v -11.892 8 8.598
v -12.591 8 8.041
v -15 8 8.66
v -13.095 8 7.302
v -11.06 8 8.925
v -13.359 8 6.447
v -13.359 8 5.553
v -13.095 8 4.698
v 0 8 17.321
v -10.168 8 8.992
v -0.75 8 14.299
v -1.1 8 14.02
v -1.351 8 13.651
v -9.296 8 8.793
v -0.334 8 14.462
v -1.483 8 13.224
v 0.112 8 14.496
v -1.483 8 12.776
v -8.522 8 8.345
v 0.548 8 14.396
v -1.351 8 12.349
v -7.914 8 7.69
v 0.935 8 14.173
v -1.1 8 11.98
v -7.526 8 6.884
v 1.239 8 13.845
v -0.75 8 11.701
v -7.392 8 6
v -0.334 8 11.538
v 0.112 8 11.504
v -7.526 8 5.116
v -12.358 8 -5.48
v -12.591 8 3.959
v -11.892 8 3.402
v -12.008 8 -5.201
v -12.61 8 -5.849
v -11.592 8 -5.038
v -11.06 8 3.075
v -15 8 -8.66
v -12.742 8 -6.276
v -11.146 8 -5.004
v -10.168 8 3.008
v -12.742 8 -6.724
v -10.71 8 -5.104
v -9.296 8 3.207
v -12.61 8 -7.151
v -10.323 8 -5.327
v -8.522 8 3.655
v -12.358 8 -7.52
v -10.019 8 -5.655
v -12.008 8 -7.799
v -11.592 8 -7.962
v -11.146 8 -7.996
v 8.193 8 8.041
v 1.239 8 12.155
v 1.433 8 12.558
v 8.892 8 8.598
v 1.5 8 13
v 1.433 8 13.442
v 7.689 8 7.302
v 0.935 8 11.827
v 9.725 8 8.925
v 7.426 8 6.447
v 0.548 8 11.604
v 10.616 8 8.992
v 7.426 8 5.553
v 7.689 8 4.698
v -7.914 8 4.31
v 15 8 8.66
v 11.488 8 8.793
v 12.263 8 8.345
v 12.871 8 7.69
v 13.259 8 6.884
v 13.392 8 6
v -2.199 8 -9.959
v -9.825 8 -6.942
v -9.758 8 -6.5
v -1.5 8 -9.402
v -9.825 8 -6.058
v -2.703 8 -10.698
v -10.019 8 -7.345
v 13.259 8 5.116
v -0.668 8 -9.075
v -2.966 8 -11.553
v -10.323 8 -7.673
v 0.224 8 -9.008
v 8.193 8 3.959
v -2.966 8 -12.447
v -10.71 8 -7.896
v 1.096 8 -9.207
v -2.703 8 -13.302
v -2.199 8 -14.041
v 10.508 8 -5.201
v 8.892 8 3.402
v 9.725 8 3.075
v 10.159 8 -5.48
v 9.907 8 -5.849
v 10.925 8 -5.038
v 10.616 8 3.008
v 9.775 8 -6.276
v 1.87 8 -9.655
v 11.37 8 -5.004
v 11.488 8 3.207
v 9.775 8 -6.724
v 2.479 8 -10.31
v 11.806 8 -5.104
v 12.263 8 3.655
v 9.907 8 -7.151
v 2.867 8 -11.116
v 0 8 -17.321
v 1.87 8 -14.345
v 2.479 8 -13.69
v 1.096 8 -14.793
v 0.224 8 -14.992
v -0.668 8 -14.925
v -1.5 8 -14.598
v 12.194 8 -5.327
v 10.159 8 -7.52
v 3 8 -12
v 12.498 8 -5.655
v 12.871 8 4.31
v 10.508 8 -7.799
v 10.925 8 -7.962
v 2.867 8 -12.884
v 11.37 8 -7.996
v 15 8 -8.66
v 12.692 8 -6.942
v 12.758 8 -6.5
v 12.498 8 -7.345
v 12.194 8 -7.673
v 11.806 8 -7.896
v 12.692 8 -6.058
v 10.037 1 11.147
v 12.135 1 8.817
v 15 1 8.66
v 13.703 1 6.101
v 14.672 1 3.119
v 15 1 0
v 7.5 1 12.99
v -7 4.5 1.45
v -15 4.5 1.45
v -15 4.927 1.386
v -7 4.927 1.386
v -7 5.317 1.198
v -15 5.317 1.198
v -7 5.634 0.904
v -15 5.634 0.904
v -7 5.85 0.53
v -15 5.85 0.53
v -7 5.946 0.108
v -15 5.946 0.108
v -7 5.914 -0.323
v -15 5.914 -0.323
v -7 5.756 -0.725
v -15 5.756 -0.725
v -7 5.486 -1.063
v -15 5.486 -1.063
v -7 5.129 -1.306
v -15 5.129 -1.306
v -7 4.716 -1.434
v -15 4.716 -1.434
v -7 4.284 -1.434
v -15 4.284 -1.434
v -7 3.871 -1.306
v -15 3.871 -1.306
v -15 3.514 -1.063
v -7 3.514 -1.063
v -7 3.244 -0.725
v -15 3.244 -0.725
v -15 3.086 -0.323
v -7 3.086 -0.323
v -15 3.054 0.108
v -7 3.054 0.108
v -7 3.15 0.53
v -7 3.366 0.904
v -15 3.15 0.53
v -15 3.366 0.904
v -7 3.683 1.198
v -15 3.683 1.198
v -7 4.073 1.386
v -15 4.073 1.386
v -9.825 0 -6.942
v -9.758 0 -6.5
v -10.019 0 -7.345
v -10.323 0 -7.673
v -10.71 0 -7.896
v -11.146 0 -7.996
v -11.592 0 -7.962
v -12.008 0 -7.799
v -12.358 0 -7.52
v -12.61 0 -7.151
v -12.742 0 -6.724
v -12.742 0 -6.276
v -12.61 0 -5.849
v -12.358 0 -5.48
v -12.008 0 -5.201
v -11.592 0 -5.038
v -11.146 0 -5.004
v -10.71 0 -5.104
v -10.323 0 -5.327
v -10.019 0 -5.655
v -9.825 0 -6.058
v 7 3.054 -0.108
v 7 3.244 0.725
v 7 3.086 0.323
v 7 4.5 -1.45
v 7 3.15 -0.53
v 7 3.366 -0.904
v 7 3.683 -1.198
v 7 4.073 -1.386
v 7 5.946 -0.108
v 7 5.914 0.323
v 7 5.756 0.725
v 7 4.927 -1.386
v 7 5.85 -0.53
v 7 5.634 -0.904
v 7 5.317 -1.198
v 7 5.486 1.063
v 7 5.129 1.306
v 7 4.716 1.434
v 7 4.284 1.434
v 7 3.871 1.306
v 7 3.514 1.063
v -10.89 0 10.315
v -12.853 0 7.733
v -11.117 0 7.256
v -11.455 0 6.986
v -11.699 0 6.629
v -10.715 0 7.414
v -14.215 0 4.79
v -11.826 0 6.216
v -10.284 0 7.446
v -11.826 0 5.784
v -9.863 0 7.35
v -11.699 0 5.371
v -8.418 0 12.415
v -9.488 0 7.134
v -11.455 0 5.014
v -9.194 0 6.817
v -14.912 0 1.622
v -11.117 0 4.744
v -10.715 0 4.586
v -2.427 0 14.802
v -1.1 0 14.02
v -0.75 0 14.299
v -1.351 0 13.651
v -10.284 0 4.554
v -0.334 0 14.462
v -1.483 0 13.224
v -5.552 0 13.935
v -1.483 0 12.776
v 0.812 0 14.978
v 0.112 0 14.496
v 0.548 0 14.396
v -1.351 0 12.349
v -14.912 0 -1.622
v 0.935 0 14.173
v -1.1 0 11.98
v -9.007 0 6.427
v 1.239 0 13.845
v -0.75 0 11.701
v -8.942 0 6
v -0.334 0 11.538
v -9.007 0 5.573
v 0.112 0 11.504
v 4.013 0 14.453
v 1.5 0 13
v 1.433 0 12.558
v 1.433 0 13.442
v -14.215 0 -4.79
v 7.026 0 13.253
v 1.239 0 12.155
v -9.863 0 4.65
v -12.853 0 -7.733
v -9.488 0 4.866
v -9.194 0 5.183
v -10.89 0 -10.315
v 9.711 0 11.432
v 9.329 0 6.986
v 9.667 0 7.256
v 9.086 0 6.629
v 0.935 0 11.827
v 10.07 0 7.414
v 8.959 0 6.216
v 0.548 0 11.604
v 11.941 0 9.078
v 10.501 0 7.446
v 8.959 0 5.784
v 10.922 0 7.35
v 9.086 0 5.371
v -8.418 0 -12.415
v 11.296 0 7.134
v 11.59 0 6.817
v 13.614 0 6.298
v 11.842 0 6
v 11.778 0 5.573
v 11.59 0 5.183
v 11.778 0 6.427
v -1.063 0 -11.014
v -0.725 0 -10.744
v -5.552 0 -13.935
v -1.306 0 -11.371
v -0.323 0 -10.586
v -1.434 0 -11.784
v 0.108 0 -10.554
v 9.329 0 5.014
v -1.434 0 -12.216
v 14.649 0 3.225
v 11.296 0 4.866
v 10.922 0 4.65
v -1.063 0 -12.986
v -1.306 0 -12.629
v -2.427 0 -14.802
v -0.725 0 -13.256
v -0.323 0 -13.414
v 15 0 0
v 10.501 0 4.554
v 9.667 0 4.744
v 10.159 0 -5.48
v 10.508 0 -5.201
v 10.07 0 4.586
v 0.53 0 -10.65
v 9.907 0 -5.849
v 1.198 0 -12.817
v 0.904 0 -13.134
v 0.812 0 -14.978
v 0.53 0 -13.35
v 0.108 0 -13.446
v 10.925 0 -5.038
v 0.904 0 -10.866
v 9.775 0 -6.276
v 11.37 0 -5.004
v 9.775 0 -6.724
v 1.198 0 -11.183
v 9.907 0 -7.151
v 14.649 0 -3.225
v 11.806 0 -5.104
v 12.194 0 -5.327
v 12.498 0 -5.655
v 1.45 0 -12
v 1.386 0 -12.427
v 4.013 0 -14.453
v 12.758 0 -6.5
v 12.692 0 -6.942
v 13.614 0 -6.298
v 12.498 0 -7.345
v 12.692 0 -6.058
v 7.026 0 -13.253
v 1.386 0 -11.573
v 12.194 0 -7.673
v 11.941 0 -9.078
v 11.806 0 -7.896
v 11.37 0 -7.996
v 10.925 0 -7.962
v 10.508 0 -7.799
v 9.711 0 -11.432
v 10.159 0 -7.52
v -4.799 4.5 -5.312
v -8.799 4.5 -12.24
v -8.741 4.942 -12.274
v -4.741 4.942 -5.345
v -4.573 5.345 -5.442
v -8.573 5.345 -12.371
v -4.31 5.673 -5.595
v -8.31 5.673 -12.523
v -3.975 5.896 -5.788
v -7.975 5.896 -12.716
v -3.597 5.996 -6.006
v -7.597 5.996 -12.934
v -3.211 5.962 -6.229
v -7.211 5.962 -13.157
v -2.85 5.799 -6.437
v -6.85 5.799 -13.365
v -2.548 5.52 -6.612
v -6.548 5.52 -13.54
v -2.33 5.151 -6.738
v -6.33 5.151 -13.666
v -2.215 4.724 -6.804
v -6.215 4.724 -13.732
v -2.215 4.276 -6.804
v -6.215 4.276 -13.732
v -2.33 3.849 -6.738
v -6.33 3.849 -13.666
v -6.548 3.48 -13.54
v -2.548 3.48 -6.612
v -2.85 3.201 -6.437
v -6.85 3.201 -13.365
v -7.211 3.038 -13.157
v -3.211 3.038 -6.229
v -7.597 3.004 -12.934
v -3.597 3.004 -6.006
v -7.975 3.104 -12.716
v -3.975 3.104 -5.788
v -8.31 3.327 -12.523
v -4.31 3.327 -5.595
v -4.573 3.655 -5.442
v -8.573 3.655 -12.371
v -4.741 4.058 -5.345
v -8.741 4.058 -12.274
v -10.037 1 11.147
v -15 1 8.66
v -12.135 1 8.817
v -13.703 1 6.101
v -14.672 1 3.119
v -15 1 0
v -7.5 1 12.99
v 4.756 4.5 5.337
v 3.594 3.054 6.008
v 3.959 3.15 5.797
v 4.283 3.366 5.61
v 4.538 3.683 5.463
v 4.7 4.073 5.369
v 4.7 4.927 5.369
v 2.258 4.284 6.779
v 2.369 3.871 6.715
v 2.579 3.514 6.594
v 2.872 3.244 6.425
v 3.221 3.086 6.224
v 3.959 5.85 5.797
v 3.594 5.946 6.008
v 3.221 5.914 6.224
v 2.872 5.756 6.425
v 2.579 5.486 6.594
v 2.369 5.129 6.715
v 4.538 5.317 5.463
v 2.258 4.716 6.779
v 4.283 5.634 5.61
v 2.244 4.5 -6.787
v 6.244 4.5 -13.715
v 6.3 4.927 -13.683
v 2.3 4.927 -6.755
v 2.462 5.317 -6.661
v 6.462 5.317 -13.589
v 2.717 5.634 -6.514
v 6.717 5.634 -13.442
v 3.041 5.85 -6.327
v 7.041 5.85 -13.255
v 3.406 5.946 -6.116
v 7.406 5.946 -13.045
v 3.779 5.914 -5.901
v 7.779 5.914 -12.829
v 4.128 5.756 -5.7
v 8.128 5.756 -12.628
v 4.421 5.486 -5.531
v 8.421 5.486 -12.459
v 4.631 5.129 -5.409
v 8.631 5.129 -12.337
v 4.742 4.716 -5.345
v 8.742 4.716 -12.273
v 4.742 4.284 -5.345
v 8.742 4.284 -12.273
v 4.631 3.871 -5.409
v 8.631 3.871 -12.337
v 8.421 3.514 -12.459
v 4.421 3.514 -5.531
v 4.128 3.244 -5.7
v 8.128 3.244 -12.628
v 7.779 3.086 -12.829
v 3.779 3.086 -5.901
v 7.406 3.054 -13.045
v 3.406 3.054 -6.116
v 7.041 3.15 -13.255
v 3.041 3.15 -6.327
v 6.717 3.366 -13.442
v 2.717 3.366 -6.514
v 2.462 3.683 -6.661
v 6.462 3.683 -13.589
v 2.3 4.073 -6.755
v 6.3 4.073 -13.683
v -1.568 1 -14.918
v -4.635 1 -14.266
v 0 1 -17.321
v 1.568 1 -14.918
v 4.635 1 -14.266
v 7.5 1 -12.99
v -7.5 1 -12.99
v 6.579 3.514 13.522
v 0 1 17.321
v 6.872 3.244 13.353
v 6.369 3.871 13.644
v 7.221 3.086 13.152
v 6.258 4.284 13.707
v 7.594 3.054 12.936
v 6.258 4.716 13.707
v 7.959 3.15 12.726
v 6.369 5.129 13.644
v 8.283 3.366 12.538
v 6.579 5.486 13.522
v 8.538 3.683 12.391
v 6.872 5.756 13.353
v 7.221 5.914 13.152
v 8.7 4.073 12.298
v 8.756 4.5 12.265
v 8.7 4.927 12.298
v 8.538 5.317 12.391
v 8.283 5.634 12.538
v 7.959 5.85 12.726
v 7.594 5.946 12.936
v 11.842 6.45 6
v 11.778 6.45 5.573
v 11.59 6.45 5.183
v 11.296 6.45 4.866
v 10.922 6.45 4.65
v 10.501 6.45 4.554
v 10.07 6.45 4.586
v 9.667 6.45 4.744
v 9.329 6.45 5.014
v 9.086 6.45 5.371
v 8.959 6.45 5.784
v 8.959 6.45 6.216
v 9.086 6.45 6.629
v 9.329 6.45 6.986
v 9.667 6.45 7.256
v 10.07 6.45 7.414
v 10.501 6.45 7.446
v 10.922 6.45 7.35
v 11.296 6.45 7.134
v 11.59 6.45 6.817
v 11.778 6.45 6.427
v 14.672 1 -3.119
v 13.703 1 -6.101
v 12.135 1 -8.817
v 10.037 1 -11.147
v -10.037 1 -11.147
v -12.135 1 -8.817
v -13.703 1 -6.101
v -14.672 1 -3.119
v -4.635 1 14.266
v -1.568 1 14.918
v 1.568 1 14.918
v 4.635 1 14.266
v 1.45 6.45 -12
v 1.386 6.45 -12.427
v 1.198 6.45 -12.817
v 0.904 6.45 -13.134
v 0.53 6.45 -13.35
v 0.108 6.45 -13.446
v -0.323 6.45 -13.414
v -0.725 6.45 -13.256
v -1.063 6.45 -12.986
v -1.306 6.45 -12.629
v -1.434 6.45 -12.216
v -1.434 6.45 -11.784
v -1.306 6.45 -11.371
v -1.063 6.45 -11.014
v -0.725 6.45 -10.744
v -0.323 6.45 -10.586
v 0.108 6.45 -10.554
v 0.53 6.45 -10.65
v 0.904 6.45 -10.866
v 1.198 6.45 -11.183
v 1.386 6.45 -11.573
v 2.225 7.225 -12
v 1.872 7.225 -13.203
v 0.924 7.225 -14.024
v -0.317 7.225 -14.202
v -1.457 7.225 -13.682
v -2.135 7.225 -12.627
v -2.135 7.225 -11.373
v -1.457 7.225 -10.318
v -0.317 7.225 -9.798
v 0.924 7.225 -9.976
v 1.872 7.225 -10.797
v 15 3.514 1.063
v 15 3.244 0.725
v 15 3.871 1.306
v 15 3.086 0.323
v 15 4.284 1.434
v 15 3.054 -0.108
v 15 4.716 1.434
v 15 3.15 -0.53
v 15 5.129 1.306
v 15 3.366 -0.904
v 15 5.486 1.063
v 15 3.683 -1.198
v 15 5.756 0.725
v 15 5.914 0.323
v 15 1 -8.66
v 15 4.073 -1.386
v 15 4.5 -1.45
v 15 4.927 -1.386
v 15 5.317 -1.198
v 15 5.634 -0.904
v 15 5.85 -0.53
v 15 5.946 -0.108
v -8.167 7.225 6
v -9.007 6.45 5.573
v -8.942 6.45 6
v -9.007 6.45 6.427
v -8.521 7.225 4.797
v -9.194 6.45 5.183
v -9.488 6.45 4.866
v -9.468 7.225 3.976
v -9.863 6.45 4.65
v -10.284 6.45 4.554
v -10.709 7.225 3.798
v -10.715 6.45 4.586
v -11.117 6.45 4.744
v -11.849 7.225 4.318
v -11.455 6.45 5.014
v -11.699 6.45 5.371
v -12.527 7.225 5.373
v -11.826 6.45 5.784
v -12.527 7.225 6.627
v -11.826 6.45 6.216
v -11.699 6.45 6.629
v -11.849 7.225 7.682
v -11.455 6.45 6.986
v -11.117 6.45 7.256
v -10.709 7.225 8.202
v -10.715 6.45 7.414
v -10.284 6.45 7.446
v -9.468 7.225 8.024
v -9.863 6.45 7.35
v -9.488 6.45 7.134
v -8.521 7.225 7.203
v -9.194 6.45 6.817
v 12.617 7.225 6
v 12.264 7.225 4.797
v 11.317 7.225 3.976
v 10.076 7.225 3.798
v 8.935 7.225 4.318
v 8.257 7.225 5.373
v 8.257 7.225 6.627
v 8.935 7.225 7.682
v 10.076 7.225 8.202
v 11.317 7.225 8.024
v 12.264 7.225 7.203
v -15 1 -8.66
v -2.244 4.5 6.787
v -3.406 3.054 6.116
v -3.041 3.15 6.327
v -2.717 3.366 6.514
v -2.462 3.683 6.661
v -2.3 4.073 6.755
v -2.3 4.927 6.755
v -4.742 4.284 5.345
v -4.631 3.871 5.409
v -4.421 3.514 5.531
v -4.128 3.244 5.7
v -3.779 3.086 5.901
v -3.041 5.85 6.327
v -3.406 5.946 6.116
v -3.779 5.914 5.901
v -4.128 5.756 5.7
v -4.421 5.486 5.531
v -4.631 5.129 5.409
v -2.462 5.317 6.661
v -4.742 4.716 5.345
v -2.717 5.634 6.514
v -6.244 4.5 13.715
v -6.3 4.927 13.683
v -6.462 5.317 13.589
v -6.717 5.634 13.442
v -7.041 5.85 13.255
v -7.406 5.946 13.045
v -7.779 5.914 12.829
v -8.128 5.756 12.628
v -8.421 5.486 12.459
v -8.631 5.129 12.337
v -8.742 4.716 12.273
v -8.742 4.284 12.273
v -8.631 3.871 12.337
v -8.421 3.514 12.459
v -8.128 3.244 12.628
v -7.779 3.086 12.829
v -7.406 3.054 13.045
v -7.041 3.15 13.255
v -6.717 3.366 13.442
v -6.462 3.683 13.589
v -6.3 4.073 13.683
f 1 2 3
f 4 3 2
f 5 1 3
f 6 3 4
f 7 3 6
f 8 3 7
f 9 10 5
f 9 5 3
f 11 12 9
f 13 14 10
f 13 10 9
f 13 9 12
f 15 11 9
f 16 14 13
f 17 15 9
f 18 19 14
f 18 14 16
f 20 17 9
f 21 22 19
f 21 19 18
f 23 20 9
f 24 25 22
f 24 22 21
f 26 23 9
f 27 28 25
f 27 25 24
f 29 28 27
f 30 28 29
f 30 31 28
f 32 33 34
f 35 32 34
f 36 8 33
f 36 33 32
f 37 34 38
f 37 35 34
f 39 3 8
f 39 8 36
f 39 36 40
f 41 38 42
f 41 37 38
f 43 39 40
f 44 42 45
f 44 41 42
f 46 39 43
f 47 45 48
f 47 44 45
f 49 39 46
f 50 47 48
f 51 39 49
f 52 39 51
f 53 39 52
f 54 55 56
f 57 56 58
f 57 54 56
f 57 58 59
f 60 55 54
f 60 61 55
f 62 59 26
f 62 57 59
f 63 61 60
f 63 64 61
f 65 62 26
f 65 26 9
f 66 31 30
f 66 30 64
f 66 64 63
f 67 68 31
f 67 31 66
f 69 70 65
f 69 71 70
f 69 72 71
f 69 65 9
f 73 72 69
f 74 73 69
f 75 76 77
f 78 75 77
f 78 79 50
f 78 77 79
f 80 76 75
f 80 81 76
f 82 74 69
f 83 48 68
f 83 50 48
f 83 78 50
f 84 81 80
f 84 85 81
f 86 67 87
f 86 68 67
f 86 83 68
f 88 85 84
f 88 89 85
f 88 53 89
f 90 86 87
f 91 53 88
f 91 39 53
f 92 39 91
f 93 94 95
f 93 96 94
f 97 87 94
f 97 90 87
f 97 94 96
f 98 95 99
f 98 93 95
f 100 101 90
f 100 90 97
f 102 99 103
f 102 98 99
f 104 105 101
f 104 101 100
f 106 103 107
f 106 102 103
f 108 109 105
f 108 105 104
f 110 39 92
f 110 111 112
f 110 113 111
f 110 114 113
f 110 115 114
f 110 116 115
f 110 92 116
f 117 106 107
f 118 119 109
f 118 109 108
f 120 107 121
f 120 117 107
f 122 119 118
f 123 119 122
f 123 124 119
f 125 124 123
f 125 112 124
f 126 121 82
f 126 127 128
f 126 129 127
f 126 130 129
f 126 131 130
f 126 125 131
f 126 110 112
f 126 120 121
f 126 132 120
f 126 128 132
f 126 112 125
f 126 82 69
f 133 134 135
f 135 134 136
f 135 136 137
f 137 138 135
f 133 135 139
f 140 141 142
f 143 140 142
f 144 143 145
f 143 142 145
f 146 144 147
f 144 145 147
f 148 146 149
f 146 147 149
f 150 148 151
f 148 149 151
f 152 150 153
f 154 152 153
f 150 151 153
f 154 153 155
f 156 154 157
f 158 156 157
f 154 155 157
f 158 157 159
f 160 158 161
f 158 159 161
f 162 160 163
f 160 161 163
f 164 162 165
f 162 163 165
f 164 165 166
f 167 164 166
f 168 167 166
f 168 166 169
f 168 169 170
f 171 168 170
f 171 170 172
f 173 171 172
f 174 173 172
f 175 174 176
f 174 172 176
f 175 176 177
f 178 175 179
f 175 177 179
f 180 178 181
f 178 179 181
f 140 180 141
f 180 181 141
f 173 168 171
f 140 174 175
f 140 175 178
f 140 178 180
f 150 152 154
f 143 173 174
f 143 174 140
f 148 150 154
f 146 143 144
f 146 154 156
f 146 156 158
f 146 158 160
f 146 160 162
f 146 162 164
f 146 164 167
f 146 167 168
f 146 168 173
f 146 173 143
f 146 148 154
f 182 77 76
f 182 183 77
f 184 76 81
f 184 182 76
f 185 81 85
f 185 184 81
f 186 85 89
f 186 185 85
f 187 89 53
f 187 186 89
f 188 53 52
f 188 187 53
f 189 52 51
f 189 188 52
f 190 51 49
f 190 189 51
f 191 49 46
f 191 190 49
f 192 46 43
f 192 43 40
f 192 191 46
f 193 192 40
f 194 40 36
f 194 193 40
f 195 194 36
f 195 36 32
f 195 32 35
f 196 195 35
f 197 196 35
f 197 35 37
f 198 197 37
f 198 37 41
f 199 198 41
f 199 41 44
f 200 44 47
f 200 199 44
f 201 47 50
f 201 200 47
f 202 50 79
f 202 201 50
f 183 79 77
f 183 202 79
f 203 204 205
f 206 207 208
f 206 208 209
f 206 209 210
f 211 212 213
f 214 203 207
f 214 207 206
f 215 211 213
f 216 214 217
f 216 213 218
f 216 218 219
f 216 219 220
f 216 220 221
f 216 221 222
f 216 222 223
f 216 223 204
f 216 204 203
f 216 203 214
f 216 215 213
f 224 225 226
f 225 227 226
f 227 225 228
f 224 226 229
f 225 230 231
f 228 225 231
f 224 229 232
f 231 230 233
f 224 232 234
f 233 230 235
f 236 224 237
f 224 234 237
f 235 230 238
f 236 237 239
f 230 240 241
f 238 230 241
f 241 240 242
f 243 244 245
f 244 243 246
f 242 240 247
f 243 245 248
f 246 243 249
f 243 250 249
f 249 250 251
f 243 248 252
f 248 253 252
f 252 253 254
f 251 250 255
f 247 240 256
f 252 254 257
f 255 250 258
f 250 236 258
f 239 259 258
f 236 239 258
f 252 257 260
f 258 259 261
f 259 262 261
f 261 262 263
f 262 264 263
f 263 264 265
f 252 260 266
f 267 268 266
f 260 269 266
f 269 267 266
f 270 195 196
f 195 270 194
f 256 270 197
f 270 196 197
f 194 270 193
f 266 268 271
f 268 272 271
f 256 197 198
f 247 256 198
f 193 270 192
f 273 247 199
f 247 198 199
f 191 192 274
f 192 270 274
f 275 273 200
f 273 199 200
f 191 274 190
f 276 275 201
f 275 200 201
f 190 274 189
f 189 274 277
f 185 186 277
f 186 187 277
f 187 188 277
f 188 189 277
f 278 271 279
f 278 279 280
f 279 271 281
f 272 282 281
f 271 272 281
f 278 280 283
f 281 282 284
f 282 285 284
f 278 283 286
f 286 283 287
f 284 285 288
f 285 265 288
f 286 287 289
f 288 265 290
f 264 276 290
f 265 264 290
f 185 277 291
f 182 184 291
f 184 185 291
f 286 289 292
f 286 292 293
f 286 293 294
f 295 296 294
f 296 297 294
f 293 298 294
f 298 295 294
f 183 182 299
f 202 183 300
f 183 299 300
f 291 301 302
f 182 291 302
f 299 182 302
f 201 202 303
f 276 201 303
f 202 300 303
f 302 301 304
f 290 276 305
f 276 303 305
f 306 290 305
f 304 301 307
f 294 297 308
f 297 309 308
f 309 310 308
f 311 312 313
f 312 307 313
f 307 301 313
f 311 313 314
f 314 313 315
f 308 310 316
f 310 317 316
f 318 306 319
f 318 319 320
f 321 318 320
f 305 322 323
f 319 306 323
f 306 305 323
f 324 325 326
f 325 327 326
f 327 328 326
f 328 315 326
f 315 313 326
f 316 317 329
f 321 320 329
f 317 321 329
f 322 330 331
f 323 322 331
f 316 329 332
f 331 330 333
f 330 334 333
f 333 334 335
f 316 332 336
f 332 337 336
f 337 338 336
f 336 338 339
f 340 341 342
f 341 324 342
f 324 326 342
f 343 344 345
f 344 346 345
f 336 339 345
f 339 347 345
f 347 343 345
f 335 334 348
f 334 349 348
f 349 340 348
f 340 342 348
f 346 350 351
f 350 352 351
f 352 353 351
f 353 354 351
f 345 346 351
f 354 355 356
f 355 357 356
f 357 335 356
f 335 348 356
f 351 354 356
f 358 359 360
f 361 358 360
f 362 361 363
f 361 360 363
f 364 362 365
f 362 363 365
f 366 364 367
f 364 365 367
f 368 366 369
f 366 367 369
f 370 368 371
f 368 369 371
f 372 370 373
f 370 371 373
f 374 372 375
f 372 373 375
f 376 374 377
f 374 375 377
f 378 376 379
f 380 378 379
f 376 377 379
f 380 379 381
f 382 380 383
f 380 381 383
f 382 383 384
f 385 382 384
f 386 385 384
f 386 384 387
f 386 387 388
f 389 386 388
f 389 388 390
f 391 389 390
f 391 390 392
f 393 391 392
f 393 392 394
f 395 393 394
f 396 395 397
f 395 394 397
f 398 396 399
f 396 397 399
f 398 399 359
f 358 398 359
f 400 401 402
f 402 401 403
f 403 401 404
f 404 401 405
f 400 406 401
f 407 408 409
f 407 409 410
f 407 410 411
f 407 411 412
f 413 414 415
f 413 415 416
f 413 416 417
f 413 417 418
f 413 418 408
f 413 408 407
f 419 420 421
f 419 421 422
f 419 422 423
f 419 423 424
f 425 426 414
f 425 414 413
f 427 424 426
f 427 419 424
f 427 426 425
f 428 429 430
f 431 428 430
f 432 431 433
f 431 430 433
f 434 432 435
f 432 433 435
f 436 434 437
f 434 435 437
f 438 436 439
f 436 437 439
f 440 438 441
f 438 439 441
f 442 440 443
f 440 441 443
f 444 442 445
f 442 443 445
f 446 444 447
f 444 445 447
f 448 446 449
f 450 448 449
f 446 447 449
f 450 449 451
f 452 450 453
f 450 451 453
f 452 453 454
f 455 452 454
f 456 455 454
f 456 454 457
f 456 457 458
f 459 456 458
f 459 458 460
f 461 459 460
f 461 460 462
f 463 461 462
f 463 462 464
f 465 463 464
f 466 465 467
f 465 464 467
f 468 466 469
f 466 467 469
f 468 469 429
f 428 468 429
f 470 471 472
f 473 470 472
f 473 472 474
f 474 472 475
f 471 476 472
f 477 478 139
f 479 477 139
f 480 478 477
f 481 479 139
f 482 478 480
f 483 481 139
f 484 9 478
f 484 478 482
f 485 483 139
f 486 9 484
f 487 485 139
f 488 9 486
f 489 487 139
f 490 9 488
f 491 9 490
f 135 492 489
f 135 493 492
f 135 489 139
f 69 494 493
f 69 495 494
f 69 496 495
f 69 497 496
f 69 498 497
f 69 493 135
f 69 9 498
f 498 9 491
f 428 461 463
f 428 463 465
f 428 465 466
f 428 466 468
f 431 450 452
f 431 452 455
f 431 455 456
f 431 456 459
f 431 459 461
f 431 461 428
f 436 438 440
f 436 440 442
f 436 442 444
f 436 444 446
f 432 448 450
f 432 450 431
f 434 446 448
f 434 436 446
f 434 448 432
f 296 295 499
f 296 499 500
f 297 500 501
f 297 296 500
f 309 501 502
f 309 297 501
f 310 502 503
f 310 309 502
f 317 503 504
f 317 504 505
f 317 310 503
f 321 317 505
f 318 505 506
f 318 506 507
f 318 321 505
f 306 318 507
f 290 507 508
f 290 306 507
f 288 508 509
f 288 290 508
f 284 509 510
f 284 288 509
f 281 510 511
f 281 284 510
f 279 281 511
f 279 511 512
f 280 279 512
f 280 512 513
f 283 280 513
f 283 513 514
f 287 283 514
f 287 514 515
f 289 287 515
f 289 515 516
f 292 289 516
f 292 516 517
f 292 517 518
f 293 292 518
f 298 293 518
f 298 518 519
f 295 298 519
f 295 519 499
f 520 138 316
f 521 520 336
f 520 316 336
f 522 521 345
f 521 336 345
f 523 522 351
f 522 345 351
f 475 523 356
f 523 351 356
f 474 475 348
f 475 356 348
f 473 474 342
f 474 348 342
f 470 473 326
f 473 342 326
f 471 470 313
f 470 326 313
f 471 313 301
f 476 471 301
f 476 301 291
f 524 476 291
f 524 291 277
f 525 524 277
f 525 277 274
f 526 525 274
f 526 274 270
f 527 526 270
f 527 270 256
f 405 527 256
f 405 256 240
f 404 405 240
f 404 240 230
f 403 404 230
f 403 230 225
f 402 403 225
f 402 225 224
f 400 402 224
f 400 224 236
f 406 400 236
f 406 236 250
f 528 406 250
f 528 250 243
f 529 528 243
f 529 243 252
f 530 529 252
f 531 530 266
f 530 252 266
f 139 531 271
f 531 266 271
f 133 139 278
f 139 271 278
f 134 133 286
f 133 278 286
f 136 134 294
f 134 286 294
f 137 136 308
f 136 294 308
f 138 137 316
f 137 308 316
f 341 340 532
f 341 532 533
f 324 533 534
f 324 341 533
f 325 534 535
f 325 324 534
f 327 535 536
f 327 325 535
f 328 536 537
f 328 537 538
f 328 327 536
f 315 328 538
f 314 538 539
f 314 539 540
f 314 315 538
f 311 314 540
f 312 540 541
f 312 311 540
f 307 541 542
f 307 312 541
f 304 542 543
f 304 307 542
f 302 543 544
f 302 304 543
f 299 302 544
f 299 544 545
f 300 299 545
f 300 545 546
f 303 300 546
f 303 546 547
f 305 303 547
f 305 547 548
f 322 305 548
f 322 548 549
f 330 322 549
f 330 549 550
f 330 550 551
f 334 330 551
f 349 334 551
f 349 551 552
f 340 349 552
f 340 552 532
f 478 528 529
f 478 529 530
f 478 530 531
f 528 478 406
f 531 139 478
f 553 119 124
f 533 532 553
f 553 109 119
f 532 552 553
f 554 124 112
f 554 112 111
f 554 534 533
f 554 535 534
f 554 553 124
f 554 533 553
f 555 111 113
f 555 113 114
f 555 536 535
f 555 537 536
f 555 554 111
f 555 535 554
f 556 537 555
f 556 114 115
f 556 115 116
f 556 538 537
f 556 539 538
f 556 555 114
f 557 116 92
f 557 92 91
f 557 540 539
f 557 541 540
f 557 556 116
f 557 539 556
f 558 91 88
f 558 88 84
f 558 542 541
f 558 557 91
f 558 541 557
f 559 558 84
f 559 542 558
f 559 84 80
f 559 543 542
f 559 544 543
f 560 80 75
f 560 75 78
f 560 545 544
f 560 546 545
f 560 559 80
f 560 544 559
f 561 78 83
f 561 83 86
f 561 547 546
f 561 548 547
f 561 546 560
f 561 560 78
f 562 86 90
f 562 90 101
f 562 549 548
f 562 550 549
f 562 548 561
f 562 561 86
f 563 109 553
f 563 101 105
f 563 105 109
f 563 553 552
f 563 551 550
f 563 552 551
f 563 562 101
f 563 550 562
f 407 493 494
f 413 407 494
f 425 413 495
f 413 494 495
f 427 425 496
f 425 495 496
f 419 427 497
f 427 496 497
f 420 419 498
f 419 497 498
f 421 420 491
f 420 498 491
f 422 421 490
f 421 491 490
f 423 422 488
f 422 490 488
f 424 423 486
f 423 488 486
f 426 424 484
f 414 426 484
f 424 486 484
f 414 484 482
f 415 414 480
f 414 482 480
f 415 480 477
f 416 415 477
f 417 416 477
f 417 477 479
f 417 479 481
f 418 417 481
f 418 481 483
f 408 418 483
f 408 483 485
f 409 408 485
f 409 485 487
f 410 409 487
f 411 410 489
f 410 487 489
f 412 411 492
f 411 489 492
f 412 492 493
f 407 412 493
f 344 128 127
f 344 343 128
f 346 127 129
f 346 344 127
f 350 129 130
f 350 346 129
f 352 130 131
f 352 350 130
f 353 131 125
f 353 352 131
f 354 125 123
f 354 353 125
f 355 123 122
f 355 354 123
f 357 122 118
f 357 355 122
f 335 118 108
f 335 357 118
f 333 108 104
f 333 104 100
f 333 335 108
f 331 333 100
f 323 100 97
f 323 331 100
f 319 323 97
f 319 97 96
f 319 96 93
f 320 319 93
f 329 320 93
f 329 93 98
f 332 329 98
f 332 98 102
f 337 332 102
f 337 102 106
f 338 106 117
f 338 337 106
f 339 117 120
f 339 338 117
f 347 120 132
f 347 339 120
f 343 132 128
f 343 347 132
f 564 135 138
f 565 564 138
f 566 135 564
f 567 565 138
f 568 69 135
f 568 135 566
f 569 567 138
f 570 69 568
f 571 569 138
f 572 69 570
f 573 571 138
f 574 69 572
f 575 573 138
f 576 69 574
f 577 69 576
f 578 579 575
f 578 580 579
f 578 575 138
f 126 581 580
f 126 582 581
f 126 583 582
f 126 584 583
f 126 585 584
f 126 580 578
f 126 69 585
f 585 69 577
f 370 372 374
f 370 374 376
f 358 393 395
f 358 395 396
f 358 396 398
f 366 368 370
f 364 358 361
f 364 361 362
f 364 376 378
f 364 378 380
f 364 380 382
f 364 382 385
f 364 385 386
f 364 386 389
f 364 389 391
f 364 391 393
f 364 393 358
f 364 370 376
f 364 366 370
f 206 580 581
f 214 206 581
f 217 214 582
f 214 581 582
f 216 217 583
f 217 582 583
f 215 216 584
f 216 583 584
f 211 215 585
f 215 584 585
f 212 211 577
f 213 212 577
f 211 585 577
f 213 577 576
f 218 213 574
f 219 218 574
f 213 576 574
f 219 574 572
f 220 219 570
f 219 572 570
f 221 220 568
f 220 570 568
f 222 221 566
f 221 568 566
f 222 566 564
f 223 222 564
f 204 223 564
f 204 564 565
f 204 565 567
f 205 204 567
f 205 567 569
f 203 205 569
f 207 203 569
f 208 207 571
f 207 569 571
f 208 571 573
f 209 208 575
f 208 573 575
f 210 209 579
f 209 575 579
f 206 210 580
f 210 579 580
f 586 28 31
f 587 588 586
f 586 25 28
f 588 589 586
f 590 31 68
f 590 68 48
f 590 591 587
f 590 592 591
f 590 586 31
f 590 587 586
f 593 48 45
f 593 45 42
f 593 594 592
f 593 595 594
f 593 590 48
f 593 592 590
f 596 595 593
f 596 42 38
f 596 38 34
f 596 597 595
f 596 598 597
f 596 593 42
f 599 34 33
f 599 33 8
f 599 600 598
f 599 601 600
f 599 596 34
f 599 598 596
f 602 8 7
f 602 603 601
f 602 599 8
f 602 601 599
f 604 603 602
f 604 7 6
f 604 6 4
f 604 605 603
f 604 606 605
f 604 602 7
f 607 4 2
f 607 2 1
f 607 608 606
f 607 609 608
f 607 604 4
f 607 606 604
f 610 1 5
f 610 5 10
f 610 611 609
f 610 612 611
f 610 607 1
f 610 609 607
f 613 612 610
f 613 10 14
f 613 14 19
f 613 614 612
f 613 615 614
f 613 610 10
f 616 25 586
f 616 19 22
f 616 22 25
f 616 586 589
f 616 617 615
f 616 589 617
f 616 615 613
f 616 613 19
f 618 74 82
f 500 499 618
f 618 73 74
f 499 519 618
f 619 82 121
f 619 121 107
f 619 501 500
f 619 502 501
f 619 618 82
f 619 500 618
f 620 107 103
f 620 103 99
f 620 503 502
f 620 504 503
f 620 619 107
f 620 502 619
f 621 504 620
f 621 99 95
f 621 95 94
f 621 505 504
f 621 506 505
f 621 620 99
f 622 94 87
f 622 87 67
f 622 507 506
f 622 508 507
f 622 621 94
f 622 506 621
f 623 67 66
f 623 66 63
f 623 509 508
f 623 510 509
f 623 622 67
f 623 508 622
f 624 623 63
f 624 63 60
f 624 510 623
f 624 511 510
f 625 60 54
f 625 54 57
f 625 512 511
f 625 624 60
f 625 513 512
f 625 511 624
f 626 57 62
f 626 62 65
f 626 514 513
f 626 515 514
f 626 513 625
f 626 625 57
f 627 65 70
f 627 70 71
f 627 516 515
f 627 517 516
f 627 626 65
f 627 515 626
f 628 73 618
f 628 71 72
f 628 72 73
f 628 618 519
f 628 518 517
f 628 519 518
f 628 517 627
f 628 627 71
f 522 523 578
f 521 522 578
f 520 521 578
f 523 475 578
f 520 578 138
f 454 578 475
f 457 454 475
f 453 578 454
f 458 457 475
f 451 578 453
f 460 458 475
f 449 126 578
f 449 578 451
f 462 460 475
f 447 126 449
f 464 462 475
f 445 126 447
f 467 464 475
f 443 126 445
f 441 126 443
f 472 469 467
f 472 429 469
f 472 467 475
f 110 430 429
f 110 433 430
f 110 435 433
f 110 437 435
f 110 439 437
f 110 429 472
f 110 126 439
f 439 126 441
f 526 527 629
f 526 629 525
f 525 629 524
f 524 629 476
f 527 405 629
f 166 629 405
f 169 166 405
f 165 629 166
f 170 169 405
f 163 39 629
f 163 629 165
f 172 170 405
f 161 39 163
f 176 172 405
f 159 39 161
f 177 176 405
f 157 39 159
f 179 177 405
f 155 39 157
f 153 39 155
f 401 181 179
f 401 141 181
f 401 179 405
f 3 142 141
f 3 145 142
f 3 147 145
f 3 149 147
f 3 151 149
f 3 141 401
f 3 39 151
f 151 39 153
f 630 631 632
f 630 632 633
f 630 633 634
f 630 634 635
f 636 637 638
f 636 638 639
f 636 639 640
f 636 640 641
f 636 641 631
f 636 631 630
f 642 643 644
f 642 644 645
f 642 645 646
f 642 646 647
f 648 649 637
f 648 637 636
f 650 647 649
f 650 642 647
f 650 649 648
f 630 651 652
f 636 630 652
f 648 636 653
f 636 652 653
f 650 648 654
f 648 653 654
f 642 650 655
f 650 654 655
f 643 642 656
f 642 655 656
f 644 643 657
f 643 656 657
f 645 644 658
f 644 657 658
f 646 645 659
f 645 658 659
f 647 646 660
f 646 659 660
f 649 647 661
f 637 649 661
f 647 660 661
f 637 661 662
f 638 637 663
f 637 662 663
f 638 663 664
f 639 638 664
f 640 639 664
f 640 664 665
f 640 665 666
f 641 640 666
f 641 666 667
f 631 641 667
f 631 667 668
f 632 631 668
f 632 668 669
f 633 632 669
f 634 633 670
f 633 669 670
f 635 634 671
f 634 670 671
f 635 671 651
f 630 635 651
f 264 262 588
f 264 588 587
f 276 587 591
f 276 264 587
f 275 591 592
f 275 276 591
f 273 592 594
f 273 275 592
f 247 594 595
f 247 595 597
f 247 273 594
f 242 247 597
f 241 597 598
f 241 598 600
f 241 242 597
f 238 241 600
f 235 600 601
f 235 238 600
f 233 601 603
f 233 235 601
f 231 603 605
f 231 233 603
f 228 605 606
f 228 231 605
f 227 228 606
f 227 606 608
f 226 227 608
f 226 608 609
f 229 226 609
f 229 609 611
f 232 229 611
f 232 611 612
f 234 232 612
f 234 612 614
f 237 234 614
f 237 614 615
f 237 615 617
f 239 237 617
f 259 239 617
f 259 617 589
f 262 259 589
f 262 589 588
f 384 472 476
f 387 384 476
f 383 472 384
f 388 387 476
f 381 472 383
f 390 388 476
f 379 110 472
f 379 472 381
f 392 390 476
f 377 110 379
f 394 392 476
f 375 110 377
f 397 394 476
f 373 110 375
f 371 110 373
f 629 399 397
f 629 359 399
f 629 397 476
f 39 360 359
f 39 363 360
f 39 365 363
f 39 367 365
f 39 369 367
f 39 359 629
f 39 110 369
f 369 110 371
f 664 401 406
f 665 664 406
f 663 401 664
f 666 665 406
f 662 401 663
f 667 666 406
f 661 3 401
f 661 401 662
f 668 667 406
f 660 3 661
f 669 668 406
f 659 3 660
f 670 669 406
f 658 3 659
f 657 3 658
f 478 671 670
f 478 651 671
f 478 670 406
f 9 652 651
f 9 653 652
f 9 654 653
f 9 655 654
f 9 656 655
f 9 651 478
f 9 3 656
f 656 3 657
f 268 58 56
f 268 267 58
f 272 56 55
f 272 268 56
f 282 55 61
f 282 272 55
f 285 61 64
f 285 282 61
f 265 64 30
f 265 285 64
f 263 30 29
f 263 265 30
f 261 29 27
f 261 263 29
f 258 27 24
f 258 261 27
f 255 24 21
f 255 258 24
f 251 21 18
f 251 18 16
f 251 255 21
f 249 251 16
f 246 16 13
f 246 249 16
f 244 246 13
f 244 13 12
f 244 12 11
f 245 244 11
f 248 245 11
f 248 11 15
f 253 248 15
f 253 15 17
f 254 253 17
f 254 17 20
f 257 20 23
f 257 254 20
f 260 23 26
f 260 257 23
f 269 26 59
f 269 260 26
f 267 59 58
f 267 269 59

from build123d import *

# Parameters (mm, degrees)
SKETCH_1_R          = 15
SKETCH_1_R_2        = 1.45
SKETCH_1_R_3        = 1.5
EXTRUDE_1_DEPTH     = 8
SKETCH_2_R          = 1.45
SKETCH_2_R_2        = 1.5
EXTRUDE_2_DEPTH     = 7
SKETCH_3_R          = 1.45
CUT_EXTRUDE_1_DEPTH = 8
SKETCH_4_R          = 1.45
CUT_EXTRUDE_2_DEPTH = 8
SKETCH_5_R          = 1.45
CUT_EXTRUDE_3_DEPTH = 8
SKETCH_6_R          = 1.45
CUT_EXTRUDE_4_DEPTH = 8
SKETCH_7_R          = 1.45
CUT_EXTRUDE_5_DEPTH = 8
SKETCH_8_R          = 1.5
CUT_EXTRUDE_6_DEPTH = 8
CHAMFER_1_SIZE      = 1.55


with BuildPart() as part:
    # 草图1 → 凸台-拉伸1 (new body)
    with BuildSketch(Plane(origin=(0, 0, 0), x_dir=(1, 0, 0), z_dir=(0, 1, 0))):
        Circle(SKETCH_1_R)
        with Locations((0, 12)):
            Circle(SKETCH_1_R_2, mode=Mode.SUBTRACT)
        with Locations((-10.392304845, -6)):
            Circle(SKETCH_1_R_2, mode=Mode.SUBTRACT)
        with Locations((10.392304845, -6)):
            Circle(SKETCH_1_R_2, mode=Mode.SUBTRACT)
        with Locations((-11.258330249, 6.5)):
            Circle(SKETCH_1_R_3, mode=Mode.SUBTRACT)
        with Locations((0, -13)):
            Circle(SKETCH_1_R_3, mode=Mode.SUBTRACT)
        with Locations((11.258330249, 6.5)):
            Circle(SKETCH_1_R_3, mode=Mode.SUBTRACT)
    extrude(amount=EXTRUDE_1_DEPTH)

    # 草图2 → 凸台-拉伸2 (add)
    with BuildSketch(Plane(origin=(0, 8, 0), x_dir=(1, 0, 0), z_dir=(0, 1, 0))):
        Polygon((0, 17.320508076), (-15, 8.660254038), (-15, -8.660254038), (0, -17.320508076), (15, -8.660254038), (15, 8.660254038), align=None)
        with Locations((0, 12)):
            Circle(SKETCH_2_R, mode=Mode.SUBTRACT)
        with Locations((-11.258330249, 6.5)):
            Circle(SKETCH_2_R_2, mode=Mode.SUBTRACT)
        with Locations((11.258330249, 6.5)):
            Circle(SKETCH_2_R_2, mode=Mode.SUBTRACT)
        with Locations((-10.392304845, -6)):
            Circle(SKETCH_2_R, mode=Mode.SUBTRACT)
        with Locations((0, -13)):
            Circle(SKETCH_2_R_2, mode=Mode.SUBTRACT)
        with Locations((10.392304845, -6)):
            Circle(SKETCH_2_R, mode=Mode.SUBTRACT)
    extrude(amount=-EXTRUDE_2_DEPTH)

    # 草图3 → 切除-拉伸1 (cut)
    with BuildSketch(Plane(origin=(7.5, 0, 12.990381057), x_dir=(0.866025404, 0, -0.5), z_dir=(0.5, 0, 0.866025404))):
        with Locations((0, 4.5)):
            Circle(SKETCH_3_R)
    extrude(amount=-CUT_EXTRUDE_1_DEPTH, mode=Mode.SUBTRACT)

    # 草图4 → 切除-拉伸2 (cut)
    with BuildSketch(Plane(origin=(-7.5, 0, 12.990381057), x_dir=(0.866025404, 0, 0.5), z_dir=(-0.5, 0, 0.866025404))):
        with Locations((0, 4.5)):
            Circle(SKETCH_4_R)
    extrude(amount=-CUT_EXTRUDE_2_DEPTH, mode=Mode.SUBTRACT)

    # 草图5 → 切除-拉伸3 (cut)
    with BuildSketch(Plane.ZY.offset(15)):
        with Locations((0, 4.5)):
            Circle(SKETCH_5_R)
    extrude(amount=-CUT_EXTRUDE_3_DEPTH, mode=Mode.SUBTRACT)

    # 草图6 → 切除-拉伸4 (cut)
    with BuildSketch(Plane(origin=(15, 0, 0), x_dir=(0, 0, -1), z_dir=(1, 0, 0))):
        with Locations((0, 4.5)):
            Circle(SKETCH_6_R)
    extrude(amount=-CUT_EXTRUDE_4_DEPTH, mode=Mode.SUBTRACT)

    # 草图7 → 切除-拉伸5 (cut)
    with BuildSketch(Plane(origin=(7.5, 0, -12.990381057), x_dir=(-0.866025404, 0, -0.5), z_dir=(0.5, 0, -0.866025404))):
        with Locations((0, 4.5)):
            Circle(SKETCH_7_R)
    extrude(amount=-CUT_EXTRUDE_5_DEPTH, mode=Mode.SUBTRACT)

    # 草图8 → 切除-拉伸6 (cut)
    with BuildSketch(Plane(origin=(-7.5, 0, -12.990381057), x_dir=(-0.866025404, 0, 0.5), z_dir=(-0.5, 0, -0.866025404))):
        with Locations((0, 4.5)):
            Circle(SKETCH_8_R)
    extrude(amount=-CUT_EXTRUDE_6_DEPTH, mode=Mode.SUBTRACT)

    # 倒角1
    chamfer_1_edges = [part.edges().sort_by_distance(p)[0] for p in [
        (8.942304845, 8, 6),
        (-1.45, 8, -12),
        (-11.842304845, 8, 6),
    ]]
    chamfer(chamfer_1_edges, length=CHAMFER_1_SIZE)


solid = part.part
